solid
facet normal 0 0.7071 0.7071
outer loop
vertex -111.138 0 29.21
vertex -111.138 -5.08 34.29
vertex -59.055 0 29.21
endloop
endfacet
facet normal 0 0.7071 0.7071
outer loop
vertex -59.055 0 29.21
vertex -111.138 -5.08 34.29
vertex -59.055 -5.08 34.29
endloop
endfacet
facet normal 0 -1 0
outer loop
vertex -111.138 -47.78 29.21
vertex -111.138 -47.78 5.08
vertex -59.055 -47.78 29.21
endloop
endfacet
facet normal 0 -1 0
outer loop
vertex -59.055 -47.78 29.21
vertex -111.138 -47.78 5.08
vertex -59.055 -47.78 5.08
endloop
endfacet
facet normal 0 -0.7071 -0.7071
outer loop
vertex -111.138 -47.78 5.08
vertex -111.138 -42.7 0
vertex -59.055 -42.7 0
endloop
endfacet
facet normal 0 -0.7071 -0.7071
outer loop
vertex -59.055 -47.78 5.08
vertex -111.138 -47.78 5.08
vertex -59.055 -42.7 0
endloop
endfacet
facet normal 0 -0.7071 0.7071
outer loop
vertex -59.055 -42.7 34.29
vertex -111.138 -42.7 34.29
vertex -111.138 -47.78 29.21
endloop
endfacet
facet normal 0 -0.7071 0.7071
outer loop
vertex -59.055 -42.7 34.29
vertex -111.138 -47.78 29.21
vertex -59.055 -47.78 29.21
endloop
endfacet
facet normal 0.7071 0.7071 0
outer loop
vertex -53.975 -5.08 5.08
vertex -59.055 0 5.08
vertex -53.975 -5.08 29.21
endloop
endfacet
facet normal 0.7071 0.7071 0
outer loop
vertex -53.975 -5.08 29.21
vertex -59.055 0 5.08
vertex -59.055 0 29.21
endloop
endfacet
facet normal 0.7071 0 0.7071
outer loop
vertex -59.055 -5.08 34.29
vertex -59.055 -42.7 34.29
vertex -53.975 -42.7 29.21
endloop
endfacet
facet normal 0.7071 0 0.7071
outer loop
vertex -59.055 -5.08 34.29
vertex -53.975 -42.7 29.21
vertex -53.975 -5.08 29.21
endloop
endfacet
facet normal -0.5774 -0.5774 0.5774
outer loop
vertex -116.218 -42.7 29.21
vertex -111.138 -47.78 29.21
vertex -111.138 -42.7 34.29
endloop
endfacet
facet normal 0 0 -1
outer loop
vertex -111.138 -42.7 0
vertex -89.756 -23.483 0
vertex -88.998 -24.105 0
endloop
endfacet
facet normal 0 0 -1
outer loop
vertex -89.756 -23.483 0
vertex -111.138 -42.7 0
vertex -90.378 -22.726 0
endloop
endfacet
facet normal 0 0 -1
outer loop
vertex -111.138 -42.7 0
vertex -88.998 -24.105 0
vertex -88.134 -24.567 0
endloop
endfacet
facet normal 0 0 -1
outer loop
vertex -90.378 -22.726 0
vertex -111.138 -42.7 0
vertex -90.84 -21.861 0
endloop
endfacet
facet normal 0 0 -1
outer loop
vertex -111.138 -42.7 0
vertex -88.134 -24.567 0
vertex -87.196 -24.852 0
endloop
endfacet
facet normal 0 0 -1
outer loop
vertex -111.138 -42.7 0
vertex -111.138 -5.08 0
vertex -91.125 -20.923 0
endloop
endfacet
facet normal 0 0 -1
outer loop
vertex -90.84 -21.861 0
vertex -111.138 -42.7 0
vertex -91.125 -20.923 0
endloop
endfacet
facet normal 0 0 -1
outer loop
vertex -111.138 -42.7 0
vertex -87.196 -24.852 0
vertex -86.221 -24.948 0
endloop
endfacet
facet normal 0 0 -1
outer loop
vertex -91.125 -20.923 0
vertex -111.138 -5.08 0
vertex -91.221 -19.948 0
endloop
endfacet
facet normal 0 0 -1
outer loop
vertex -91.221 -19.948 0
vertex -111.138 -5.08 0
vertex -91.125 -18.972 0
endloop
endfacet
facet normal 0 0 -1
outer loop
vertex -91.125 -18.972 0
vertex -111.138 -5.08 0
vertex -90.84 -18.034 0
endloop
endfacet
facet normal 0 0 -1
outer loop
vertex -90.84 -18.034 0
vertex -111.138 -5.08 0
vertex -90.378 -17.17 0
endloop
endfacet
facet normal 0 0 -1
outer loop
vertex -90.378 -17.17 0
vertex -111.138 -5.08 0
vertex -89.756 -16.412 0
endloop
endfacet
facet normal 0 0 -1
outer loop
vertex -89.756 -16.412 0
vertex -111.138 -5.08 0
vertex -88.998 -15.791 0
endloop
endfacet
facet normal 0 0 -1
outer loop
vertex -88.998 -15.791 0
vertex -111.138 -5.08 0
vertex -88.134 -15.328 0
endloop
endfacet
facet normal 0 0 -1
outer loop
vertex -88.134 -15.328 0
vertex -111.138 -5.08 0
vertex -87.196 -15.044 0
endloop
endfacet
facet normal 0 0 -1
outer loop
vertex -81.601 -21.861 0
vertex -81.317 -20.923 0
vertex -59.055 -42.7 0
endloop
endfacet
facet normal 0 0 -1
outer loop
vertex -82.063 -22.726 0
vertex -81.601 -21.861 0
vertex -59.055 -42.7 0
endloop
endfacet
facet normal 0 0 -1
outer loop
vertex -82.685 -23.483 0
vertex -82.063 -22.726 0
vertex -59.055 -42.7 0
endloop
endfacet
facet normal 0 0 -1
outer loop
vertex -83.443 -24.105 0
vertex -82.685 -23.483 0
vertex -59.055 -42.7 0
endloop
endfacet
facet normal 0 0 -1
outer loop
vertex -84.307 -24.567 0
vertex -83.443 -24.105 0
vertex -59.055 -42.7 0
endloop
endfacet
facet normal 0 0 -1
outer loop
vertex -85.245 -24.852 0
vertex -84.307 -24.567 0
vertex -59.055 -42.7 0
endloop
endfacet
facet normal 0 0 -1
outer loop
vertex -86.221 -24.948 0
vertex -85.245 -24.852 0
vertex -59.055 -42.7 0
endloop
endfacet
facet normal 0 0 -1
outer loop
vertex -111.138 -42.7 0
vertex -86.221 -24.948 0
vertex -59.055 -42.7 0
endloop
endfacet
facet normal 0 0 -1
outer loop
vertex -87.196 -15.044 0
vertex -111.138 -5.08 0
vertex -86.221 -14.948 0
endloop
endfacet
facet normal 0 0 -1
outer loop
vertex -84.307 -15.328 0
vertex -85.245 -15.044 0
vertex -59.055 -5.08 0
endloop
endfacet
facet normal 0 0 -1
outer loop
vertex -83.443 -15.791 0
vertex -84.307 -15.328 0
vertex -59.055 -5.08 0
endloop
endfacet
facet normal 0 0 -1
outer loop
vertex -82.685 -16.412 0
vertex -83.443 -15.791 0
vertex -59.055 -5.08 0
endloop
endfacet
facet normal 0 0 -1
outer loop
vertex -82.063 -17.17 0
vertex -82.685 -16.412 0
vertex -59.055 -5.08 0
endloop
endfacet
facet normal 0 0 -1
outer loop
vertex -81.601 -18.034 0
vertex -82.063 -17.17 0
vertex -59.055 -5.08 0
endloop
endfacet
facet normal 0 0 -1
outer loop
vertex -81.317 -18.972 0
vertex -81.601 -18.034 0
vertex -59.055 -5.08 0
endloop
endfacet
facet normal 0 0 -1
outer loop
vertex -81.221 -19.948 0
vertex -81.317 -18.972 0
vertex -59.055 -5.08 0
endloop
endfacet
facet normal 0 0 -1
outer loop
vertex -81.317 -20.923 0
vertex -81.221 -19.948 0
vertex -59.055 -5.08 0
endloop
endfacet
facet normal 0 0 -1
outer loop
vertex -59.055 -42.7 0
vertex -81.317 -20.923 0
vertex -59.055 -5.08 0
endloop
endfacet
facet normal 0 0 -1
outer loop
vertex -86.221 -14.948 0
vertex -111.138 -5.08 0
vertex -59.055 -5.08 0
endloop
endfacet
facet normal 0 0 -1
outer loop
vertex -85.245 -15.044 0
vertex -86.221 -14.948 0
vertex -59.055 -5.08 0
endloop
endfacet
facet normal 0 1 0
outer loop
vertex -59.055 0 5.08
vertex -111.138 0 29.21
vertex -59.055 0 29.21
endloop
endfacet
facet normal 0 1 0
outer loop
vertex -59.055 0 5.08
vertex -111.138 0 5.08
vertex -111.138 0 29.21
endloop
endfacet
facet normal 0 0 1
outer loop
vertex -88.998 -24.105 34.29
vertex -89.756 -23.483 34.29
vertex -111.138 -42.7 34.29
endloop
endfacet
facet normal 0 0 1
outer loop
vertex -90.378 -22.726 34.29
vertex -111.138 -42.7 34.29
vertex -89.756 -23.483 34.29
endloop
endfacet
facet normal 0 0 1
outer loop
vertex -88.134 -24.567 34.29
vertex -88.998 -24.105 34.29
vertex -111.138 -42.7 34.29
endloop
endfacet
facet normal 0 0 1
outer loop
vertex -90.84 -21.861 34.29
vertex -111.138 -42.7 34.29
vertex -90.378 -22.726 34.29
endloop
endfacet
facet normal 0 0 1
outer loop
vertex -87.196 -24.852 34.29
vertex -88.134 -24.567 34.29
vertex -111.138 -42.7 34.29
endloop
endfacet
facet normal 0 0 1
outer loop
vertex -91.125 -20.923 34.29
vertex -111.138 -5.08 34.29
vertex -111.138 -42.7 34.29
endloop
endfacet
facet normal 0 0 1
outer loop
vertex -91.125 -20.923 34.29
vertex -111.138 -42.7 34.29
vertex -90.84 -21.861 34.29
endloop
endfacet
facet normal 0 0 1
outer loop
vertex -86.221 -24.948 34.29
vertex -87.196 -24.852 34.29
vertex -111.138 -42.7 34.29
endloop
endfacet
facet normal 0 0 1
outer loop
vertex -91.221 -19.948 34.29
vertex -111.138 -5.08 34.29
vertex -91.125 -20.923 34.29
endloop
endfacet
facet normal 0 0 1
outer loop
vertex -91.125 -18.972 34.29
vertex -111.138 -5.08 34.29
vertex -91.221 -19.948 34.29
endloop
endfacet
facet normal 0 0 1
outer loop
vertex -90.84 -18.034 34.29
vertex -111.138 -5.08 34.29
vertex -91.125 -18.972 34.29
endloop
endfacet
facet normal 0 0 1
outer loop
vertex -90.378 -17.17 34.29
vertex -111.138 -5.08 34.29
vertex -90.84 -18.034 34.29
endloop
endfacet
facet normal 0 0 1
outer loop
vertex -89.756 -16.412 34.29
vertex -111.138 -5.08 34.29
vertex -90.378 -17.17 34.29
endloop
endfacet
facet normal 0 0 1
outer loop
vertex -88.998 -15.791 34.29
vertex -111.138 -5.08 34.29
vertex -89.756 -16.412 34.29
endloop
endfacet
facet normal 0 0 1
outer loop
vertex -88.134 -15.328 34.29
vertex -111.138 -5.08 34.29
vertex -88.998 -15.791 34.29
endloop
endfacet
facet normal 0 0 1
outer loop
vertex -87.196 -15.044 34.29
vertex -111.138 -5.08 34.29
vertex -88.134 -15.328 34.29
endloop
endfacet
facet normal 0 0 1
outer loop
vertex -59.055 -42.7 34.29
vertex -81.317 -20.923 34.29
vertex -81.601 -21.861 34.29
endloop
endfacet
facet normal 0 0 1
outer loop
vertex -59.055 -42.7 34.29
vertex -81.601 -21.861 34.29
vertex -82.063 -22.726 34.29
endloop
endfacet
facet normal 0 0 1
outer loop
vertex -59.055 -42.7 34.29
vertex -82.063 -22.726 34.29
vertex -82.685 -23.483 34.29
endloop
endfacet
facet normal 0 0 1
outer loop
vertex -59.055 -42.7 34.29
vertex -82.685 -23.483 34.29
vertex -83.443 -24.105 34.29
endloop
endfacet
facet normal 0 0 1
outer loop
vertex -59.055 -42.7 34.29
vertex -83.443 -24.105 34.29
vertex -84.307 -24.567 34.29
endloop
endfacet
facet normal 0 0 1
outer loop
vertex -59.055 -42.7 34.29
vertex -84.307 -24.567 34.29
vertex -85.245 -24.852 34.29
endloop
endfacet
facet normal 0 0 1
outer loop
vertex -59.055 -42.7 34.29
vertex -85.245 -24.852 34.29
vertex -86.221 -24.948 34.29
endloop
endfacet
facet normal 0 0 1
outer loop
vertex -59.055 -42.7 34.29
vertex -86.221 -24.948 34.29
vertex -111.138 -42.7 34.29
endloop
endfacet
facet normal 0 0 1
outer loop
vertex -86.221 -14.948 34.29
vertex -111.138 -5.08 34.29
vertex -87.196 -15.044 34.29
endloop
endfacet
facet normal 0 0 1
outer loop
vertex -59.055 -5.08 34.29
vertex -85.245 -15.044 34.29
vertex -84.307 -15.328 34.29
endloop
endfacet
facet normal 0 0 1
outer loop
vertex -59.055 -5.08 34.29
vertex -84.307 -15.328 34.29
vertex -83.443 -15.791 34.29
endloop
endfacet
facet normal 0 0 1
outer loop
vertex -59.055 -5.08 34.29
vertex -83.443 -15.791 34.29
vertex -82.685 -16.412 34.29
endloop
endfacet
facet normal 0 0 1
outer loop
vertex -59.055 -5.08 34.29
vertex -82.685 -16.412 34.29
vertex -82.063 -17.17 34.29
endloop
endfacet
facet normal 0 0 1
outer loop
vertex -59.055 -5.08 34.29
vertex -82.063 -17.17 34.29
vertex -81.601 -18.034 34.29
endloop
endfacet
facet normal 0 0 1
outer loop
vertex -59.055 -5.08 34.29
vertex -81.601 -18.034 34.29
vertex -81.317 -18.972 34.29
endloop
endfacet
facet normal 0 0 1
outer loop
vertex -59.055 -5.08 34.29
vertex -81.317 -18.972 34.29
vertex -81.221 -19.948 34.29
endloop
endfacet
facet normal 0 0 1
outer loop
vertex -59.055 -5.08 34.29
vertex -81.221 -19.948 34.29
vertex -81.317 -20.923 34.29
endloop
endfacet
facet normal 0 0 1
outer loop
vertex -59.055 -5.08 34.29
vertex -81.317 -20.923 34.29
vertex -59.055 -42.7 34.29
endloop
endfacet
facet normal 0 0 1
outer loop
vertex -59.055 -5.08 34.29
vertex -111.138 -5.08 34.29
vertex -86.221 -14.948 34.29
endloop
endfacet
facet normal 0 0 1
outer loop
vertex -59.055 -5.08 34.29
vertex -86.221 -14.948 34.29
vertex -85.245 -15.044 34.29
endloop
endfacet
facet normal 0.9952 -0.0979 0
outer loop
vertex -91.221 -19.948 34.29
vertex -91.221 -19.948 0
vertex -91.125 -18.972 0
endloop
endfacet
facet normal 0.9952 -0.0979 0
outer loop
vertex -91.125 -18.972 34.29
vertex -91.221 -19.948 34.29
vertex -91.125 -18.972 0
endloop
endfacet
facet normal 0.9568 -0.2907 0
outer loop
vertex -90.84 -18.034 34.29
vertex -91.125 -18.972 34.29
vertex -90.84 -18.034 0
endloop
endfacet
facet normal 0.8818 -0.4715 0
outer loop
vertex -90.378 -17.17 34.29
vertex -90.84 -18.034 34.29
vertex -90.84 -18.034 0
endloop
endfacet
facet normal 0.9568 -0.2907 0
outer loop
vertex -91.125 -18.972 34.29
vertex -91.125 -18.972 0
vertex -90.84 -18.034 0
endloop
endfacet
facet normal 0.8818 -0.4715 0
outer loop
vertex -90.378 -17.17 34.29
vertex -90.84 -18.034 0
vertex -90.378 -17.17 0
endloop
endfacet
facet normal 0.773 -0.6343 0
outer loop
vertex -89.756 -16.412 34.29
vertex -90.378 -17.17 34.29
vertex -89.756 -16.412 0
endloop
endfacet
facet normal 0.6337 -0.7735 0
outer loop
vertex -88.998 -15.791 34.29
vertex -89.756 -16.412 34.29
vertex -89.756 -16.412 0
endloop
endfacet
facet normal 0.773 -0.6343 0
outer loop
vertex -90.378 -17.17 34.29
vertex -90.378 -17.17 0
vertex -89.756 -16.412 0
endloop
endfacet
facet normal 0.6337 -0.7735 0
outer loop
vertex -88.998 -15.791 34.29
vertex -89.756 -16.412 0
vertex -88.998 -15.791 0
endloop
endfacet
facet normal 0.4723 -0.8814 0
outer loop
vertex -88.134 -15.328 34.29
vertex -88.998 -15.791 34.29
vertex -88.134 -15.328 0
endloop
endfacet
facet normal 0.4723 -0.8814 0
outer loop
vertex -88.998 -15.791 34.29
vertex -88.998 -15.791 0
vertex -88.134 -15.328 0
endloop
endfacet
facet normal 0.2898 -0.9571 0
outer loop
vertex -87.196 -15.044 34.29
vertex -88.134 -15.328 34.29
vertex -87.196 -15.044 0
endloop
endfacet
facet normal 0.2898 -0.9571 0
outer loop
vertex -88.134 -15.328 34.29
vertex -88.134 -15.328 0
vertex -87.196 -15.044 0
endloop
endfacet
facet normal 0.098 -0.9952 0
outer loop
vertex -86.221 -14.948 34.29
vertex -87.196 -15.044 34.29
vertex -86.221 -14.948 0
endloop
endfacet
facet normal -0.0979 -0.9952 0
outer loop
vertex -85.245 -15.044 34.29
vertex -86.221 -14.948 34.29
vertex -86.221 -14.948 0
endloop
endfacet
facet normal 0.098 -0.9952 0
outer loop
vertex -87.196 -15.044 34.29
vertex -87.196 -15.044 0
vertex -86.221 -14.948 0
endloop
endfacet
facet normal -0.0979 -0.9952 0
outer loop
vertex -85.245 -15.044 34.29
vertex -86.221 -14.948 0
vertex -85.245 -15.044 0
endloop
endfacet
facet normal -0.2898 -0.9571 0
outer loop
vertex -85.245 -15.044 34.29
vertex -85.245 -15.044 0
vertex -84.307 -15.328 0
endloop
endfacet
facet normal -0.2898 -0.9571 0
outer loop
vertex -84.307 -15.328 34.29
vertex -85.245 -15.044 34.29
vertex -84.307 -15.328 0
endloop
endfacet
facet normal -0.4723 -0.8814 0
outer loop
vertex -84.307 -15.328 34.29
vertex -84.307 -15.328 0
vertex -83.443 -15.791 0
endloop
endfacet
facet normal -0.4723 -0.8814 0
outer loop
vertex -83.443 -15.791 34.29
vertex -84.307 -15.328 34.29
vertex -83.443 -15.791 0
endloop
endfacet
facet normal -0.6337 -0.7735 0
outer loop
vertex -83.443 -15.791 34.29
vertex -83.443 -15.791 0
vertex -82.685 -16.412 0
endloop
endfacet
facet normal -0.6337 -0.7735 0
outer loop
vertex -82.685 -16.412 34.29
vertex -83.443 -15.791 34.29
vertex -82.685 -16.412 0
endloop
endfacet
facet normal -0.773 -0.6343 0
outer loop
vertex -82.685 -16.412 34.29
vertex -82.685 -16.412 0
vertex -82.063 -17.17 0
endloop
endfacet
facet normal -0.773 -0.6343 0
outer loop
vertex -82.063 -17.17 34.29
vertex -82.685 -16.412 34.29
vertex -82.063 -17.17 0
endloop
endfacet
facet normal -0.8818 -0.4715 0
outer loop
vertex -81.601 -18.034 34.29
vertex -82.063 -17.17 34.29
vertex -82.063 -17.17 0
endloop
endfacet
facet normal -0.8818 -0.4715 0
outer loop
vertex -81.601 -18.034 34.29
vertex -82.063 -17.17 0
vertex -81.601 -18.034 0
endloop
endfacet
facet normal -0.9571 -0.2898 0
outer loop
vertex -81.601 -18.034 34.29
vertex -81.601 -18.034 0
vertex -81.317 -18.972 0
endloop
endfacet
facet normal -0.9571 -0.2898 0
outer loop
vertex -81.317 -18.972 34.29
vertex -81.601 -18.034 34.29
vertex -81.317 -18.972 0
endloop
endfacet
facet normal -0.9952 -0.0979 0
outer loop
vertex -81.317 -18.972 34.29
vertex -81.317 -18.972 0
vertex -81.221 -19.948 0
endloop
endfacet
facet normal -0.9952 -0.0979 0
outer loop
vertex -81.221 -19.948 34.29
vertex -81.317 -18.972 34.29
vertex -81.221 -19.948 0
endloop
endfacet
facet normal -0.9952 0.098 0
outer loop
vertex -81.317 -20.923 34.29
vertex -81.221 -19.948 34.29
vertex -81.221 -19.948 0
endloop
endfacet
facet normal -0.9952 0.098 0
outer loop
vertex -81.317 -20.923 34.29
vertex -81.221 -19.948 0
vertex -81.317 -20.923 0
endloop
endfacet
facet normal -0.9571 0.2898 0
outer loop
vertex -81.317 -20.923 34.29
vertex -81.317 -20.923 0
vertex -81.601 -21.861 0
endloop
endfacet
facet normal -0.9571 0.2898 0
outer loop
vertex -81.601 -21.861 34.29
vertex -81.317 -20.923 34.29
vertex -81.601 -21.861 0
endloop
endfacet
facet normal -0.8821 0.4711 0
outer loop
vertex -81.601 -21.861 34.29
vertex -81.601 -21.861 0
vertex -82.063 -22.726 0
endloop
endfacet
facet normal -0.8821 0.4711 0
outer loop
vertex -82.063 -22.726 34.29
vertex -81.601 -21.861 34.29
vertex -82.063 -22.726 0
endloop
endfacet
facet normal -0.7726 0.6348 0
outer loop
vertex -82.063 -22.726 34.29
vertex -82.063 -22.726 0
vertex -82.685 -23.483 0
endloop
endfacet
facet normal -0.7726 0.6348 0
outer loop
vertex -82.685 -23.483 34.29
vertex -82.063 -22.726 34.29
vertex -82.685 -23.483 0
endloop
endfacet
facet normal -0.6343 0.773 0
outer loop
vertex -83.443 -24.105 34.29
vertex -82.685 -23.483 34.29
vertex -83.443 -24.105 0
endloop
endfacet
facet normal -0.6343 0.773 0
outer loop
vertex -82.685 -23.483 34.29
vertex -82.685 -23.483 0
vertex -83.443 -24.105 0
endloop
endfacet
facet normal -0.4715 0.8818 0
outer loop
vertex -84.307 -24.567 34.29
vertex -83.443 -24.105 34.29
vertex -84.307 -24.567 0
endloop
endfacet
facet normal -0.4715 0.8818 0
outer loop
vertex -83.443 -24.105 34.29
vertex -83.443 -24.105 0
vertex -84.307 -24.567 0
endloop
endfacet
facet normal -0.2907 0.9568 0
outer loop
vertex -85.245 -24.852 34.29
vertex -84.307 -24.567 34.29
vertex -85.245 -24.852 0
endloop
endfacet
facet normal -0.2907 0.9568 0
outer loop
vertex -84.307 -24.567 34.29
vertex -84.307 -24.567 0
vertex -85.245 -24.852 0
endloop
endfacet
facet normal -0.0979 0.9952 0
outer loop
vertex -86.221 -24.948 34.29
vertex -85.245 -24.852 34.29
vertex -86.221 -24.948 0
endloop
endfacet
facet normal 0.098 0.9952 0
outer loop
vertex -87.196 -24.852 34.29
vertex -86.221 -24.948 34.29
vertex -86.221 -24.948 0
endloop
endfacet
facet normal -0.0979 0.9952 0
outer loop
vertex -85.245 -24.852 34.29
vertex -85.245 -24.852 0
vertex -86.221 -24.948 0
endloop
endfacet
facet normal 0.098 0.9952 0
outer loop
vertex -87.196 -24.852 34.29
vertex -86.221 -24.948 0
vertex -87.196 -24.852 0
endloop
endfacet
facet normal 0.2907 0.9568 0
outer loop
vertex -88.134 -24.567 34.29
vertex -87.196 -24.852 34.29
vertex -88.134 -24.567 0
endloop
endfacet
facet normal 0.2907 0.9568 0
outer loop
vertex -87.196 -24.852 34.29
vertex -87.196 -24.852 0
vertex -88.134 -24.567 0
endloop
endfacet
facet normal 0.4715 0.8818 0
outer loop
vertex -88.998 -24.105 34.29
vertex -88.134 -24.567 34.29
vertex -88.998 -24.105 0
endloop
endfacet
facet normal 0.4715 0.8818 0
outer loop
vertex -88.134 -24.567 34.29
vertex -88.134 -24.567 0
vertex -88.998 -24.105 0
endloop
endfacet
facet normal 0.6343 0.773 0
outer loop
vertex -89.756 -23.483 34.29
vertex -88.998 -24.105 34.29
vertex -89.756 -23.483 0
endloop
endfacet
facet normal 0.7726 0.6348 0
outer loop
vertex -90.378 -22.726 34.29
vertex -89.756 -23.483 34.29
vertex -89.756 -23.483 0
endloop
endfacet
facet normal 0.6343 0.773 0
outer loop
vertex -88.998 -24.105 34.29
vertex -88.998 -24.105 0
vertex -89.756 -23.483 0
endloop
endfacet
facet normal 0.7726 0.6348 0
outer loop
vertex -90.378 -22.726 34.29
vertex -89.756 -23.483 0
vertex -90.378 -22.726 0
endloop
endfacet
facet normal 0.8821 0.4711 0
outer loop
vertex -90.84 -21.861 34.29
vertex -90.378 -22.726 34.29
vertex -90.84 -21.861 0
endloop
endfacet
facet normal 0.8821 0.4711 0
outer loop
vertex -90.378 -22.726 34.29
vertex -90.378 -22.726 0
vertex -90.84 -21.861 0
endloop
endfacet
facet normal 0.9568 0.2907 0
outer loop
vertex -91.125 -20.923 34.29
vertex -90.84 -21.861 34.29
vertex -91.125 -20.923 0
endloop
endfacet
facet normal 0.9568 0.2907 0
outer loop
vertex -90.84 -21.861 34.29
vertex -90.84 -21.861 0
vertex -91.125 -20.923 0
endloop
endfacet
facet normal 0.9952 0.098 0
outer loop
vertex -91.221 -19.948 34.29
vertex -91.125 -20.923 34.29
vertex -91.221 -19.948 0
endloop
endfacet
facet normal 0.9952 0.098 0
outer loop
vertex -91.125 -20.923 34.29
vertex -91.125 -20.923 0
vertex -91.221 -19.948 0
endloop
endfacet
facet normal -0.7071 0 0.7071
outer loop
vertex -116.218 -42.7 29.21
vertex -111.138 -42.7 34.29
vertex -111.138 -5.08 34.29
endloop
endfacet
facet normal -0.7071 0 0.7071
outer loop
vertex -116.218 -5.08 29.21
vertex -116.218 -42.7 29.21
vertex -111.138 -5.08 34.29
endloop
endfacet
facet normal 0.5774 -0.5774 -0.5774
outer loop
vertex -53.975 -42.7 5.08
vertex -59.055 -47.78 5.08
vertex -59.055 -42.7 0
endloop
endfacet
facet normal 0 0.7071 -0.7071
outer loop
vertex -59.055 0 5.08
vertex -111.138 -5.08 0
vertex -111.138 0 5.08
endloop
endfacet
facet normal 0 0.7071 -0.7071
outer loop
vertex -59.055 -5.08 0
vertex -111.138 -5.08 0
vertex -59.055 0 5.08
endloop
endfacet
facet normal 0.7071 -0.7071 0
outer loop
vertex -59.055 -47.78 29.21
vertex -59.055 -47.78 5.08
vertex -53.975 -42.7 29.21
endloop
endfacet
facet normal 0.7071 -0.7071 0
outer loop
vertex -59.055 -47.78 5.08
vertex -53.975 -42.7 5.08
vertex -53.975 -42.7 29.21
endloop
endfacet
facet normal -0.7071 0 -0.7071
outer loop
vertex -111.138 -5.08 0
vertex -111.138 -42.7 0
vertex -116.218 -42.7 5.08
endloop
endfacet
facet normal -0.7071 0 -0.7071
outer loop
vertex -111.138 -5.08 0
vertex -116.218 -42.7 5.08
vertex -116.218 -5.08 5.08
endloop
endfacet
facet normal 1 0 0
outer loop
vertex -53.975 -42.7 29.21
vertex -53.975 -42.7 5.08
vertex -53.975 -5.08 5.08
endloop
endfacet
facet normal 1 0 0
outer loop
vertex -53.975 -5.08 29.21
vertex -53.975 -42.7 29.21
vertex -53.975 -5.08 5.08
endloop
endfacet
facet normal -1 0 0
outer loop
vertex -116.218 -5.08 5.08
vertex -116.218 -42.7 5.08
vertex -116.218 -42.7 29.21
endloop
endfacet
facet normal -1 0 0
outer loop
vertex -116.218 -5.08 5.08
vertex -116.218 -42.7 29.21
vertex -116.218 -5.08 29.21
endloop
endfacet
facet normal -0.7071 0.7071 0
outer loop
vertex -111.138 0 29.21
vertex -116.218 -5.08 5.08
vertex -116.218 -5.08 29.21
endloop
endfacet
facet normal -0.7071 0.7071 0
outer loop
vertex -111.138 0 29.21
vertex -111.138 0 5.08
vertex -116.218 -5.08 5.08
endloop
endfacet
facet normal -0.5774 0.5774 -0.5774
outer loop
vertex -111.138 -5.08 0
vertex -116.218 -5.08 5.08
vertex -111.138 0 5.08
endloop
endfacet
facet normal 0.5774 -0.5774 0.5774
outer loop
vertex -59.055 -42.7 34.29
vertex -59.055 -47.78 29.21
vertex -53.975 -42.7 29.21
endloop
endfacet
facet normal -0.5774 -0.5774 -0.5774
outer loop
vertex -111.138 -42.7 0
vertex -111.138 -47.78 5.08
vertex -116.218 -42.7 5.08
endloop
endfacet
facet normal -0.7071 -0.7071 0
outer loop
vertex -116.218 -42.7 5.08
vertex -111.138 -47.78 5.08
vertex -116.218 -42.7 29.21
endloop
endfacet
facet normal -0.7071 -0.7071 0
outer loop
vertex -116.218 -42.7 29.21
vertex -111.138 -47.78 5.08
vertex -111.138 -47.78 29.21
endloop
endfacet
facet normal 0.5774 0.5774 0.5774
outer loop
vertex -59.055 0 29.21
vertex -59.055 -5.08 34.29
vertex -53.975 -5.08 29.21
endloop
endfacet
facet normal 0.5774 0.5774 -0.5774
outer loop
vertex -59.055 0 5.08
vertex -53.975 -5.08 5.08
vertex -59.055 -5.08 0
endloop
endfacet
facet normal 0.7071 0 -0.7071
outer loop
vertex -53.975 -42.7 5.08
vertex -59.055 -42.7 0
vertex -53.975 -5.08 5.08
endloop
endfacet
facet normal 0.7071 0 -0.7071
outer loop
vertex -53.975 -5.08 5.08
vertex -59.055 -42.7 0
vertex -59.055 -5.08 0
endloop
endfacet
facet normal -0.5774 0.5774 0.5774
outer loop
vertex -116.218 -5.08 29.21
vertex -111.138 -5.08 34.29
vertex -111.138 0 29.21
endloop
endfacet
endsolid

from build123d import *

# Parameters (mm, degrees)
F0_W     = 62.2431822121
F0_H     = 47.7795563638
F1_DEPTH = 34.29
F2_SIZE  = 5.08
F4_D     = 10


with BuildPart() as f1:
    # F0 (on Top) → F1 (new body)
    with BuildSketch(Plane.XY):
        with Locations((-85.0962679833, -23.8897781819)):
            Rectangle(F0_W, F0_H)
    extrude(amount=F1_DEPTH)

    # F2
    f2_edges = [f1.edges().sort_by_distance(p)[0] for p in [
        (-116.217859, -47.779556, 17.145),
        (-53.974677, -47.779556, 17.145),
        (-85.096268, -47.779556, 0),
        (-85.096268, -47.779556, 34.29),
        (-85.096268, 0, 34.29),
        (-116.217859, -23.889778, 34.29),
        (-53.974677, -23.889778, 34.29),
        (-53.974677, 0, 17.145),
        (-53.974677, -23.889778, 0),
        (-116.217859, 0, 17.145),
        (-116.217859, -23.889778, 0),
        (-85.096268, 0, 0),
    ]]
    chamfer(f2_edges, length=F2_SIZE)

    # F4 (through all)
    with Locations(Plane.XY.offset(34.29)):
        with Locations((-86.2206369638, -19.9478901923)):
            Hole(F4_D / 2)


solid = f1.part
